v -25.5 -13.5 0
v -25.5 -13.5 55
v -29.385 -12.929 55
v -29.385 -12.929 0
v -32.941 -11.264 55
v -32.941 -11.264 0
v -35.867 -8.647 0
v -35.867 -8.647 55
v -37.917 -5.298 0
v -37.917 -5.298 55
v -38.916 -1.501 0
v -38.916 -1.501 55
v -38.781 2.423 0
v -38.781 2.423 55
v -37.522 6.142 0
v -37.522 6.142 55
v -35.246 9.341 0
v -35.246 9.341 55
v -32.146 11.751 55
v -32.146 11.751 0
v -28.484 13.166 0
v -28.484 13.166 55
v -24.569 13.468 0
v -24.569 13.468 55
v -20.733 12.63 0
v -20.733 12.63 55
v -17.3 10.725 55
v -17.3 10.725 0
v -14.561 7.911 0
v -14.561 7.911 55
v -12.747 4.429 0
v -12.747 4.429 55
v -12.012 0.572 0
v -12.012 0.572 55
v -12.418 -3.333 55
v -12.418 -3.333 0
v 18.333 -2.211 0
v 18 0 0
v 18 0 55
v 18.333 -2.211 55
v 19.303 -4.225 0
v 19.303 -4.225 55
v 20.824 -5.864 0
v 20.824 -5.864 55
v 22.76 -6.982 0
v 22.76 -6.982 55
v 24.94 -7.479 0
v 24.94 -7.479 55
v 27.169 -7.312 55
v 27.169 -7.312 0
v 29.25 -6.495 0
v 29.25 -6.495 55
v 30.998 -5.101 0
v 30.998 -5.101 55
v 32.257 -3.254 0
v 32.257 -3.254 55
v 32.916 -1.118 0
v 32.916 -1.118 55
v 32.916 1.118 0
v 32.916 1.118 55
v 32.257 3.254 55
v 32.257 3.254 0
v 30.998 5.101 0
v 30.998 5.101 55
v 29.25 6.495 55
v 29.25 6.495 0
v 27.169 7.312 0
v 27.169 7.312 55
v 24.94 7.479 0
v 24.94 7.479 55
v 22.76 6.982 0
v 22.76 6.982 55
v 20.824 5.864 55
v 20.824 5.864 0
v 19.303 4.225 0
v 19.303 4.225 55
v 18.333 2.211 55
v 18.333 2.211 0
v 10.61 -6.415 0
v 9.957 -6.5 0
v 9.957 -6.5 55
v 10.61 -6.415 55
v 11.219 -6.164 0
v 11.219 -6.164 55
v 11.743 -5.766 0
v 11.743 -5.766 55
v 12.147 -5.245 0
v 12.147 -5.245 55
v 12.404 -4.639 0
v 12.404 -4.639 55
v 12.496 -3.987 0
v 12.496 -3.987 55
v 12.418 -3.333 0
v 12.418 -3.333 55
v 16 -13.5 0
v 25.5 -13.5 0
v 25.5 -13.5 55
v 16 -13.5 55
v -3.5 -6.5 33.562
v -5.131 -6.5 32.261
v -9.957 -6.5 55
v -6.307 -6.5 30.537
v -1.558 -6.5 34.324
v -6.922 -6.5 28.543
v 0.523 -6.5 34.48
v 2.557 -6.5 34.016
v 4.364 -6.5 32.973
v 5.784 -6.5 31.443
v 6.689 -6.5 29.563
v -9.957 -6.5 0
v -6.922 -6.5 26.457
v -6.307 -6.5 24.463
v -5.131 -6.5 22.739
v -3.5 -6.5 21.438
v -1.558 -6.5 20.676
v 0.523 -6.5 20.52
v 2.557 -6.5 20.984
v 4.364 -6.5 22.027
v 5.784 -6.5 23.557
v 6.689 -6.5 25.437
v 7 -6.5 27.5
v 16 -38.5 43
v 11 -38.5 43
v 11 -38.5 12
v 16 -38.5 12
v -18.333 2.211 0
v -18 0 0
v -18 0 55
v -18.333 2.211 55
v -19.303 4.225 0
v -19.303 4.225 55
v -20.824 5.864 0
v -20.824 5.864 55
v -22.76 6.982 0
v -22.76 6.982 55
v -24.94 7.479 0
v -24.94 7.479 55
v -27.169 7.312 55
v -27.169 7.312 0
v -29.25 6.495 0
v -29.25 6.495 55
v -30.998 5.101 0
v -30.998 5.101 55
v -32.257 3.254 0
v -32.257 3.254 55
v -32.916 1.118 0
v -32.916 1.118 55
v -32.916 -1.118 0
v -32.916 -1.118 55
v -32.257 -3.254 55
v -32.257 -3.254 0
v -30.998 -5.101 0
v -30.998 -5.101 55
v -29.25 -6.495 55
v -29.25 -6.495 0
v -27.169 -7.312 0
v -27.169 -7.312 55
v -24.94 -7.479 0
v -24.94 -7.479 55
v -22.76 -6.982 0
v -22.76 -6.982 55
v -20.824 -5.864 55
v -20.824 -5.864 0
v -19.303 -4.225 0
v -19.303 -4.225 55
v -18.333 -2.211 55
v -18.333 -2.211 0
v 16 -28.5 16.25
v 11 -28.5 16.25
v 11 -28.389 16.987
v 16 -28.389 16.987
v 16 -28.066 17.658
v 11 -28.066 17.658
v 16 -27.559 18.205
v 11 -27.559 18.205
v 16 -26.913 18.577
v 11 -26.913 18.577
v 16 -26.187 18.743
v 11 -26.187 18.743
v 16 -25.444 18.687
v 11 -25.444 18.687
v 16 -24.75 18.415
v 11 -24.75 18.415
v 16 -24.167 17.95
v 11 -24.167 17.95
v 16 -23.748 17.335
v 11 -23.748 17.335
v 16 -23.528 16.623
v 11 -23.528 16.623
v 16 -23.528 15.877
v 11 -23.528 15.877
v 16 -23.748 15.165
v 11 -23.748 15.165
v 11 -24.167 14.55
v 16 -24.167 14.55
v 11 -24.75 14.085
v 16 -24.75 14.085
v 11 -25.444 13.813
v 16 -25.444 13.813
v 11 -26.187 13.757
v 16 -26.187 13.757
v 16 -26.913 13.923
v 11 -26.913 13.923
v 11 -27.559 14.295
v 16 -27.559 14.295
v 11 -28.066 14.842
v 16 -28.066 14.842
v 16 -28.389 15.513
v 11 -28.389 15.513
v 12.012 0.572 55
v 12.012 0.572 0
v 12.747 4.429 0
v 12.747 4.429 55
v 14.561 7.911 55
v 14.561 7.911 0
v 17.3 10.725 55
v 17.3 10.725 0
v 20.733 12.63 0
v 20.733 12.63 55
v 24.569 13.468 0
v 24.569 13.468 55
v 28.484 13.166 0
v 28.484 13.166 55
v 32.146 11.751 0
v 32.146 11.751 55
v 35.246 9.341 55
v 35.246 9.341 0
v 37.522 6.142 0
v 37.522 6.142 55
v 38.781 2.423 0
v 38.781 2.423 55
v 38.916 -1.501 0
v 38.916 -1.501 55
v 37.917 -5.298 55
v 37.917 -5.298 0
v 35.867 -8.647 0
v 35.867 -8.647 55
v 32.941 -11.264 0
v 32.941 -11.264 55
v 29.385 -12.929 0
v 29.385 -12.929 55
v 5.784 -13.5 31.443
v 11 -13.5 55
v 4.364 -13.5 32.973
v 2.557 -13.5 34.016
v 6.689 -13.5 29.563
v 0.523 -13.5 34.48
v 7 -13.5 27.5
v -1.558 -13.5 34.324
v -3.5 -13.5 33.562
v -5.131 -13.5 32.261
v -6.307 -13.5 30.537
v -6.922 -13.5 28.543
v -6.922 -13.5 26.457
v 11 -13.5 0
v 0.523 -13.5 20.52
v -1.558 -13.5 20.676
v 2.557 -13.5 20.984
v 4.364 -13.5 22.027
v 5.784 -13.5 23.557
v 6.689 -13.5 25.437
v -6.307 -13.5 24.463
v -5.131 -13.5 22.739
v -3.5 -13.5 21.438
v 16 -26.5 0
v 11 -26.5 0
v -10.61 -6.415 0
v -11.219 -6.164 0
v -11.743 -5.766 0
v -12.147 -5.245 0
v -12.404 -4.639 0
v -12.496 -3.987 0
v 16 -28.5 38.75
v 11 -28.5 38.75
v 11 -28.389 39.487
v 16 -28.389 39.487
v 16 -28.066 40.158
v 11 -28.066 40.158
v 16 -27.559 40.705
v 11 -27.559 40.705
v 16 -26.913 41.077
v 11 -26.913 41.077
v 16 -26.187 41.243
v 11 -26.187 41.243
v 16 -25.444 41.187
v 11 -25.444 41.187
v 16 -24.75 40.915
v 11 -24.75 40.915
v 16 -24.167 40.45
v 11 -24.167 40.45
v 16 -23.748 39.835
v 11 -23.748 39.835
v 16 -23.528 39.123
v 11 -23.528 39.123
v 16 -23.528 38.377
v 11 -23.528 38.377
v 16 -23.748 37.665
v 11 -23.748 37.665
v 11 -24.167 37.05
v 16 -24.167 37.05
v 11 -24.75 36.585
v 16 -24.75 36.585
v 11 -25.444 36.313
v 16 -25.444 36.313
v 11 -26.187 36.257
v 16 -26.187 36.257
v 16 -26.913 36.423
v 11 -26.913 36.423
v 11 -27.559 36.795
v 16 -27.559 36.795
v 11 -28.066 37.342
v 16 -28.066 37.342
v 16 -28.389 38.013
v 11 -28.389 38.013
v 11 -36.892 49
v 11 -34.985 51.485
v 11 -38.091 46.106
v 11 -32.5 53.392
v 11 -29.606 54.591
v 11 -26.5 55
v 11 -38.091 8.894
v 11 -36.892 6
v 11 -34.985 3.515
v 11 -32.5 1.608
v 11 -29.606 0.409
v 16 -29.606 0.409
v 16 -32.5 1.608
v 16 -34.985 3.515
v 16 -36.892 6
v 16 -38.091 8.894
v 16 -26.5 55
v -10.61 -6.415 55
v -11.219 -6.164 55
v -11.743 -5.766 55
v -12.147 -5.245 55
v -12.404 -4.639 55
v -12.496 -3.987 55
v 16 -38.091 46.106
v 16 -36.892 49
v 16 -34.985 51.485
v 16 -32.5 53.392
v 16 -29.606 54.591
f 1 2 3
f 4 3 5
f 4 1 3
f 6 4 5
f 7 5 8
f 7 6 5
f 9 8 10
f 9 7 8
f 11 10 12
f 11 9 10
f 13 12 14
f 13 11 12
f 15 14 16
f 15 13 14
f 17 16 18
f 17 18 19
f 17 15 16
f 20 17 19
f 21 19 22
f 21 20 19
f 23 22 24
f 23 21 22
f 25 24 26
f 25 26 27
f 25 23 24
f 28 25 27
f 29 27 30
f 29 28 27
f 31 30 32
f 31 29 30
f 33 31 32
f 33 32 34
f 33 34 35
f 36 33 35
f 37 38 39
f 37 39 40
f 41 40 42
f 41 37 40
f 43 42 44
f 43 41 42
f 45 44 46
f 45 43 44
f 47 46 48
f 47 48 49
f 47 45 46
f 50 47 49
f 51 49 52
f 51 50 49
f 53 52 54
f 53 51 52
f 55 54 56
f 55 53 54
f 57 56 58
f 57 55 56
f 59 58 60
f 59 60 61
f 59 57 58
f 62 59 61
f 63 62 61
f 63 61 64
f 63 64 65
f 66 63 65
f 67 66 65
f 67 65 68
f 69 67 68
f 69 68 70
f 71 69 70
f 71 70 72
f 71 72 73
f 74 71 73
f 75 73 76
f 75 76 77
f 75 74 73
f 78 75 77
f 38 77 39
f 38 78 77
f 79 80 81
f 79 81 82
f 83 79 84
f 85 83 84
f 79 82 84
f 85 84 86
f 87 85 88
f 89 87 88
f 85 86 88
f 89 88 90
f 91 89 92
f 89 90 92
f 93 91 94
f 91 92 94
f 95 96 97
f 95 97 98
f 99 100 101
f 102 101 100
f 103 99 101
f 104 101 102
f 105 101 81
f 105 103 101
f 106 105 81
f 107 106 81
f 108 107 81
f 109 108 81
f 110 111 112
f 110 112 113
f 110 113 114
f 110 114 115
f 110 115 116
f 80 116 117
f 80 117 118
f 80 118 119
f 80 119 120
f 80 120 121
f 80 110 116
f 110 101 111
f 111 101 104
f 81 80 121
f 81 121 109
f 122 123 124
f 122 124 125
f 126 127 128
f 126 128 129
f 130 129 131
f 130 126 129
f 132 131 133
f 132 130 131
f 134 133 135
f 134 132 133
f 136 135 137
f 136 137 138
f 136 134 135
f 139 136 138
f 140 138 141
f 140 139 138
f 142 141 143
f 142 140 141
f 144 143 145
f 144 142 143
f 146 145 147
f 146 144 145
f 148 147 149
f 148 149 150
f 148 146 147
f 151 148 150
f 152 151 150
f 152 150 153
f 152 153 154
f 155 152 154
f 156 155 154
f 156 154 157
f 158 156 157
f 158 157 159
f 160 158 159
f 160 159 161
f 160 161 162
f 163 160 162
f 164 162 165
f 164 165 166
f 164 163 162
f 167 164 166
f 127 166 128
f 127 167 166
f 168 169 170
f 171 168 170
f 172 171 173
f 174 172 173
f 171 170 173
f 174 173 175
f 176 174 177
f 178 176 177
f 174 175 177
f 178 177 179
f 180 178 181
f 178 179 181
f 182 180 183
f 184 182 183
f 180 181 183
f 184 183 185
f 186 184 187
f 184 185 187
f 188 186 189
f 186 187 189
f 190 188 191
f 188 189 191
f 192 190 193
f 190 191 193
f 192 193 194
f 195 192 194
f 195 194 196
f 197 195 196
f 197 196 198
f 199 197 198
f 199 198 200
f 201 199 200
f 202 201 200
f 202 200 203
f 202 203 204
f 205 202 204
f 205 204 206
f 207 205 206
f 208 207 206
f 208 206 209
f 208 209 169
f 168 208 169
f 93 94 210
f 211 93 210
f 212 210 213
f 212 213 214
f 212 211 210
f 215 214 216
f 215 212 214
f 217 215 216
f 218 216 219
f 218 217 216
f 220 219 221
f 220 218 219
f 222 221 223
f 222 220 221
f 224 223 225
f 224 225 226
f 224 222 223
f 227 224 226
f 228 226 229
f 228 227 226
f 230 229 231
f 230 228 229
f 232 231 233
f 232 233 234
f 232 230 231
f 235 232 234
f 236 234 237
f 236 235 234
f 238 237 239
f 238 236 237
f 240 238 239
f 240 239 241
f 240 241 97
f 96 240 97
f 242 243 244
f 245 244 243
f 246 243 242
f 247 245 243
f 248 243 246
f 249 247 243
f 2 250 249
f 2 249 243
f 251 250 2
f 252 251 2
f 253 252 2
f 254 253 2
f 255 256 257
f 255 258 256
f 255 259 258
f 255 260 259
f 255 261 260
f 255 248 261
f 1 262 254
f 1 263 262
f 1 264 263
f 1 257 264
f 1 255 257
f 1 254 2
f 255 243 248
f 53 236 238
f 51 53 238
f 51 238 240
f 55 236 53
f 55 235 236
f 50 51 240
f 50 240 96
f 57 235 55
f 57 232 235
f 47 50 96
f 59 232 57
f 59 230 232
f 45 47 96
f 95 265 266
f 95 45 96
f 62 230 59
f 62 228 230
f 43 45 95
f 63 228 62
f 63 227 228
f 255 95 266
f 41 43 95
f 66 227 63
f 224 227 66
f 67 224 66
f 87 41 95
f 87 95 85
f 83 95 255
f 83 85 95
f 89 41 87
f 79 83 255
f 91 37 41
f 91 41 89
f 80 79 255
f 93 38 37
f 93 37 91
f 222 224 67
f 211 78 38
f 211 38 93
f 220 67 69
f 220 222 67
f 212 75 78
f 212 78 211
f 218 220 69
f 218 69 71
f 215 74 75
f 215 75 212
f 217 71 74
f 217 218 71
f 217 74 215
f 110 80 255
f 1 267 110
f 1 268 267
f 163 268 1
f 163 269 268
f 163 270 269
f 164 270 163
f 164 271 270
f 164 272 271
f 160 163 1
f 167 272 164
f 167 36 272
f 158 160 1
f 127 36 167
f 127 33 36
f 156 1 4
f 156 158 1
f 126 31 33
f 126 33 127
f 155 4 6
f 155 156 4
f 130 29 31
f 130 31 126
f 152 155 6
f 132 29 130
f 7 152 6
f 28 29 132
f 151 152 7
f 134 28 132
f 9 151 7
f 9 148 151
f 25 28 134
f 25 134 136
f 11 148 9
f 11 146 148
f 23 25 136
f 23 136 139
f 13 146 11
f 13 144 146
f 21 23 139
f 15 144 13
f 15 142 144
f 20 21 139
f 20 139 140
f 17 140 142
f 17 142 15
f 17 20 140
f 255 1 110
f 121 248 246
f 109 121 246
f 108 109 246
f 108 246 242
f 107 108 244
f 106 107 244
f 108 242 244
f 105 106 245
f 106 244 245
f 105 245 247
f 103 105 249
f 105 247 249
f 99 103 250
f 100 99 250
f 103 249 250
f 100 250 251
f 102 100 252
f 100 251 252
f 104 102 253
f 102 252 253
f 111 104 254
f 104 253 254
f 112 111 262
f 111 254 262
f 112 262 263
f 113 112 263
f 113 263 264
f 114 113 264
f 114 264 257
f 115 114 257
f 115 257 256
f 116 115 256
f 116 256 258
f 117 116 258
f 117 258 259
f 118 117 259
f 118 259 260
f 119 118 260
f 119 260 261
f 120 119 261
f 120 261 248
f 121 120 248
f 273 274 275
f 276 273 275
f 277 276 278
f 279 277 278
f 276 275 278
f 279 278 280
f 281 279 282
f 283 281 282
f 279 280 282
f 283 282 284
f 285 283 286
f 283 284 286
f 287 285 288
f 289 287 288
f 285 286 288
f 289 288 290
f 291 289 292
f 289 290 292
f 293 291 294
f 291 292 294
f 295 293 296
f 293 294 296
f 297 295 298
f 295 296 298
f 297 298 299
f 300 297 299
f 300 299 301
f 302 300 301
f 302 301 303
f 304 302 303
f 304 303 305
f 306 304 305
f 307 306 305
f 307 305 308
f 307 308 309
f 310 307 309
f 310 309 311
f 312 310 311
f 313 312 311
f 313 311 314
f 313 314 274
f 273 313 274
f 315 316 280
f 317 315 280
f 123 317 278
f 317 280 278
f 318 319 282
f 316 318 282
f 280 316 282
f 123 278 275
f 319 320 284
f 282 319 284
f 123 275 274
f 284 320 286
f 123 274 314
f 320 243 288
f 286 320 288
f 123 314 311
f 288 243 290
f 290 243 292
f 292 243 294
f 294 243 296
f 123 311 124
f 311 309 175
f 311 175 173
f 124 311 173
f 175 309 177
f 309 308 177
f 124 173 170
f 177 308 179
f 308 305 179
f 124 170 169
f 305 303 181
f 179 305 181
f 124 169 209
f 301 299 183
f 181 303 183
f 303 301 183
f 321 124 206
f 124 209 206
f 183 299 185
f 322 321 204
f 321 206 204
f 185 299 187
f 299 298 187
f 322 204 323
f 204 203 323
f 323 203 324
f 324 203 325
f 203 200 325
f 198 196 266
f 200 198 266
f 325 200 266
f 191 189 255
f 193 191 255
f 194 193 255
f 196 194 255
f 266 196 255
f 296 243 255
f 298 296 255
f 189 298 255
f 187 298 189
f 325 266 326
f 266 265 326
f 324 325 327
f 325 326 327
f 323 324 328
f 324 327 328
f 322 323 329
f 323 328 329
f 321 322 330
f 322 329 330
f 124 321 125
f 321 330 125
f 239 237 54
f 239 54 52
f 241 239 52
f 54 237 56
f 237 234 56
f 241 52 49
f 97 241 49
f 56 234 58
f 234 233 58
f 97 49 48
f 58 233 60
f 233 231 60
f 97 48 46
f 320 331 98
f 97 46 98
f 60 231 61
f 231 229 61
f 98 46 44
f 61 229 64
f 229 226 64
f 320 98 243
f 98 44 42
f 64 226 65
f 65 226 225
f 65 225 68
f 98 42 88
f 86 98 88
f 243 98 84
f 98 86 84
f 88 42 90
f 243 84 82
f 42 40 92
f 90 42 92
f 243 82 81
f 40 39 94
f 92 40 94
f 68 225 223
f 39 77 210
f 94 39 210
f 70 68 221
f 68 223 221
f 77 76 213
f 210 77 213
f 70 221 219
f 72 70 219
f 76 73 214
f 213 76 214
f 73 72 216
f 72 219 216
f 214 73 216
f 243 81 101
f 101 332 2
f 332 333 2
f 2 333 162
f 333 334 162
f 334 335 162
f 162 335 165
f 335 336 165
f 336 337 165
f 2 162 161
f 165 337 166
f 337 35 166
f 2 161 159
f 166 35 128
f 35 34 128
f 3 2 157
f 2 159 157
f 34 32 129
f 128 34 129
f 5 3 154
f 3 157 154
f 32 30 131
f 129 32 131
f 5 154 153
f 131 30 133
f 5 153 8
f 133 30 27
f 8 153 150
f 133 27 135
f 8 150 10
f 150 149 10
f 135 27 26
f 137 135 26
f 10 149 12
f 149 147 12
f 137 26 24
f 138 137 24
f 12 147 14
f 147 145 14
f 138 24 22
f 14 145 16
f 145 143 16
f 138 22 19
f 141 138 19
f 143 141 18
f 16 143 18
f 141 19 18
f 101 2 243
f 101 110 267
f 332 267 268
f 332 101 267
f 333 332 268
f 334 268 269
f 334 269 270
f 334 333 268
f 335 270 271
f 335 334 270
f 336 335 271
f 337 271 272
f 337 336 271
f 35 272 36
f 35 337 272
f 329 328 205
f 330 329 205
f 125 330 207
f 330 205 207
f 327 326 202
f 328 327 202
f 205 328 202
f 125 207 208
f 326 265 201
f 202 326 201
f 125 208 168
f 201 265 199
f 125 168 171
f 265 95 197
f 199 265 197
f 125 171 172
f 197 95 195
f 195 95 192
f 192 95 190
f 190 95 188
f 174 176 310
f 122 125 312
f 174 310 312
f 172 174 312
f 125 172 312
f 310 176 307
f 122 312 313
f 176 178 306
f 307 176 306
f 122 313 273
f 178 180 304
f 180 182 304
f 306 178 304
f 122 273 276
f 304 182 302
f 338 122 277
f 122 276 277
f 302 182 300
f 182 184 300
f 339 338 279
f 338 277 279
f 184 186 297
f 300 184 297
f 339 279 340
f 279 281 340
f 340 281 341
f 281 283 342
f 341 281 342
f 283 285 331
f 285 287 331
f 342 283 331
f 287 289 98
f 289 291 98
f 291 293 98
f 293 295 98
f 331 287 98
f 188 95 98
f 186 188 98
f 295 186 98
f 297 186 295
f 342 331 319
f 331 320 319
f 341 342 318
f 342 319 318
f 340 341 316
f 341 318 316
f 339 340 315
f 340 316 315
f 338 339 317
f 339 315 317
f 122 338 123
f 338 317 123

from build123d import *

# Parameters (mm, degrees)
SKETCH1_R           = 7.5
BOSS_EXTRUDE1_DEPTH = 55
FILLET1_R           = 2.54
BOSS_EXTRUDE2_DEPTH = 25
SKETCH4_R           = 7
CUT_EXTRUDE1_DEPTH  = 73.629195232
FILLET2_R           = 12
SKETCH5_R           = 2.5
CUT_EXTRUDE2_DEPTH  = 87.734978206


with BuildPart() as part:
    # Sketch1 → Boss-Extrude1 (new body)
    with BuildSketch(Plane.XY):
        with BuildLine():
            Line((-13.667840434, -6.5), (13.667840434, -6.5))
            ThreePointArc((13.667840434, -6.5), (32.373863542, 11.618950039), (25.5, -13.5))
            Line((25.5, -13.5), (-25.5, -13.5))
            ThreePointArc((-25.5, -13.5), (-32.373863542, 11.618950039), (-13.667840434, -6.5))
        make_face()
        with Locations((-25.5, 0)):
            Circle(SKETCH1_R, mode=Mode.SUBTRACT)
        with Locations(Location((25.5, 0, 0), (0, 0, 180))):
            Circle(SKETCH1_R, mode=Mode.SUBTRACT)
    extrude(amount=BOSS_EXTRUDE1_DEPTH)

    # Fillet1
    fillet1_edges = [part.edges().sort_by_distance(p)[0] for p in [
        (-13.667840434, -6.5, 27.5),
        (13.667840434, -6.5, 27.5),
    ]]
    fillet(fillet1_edges, radius=FILLET1_R)

    # Sketch2 → Boss-Extrude2 (add)
    with BuildSketch(Plane.XZ.offset(13.5)):
        Polygon((11, 15.637254902), (16, 10.245098039), (16, 55), (11, 55), align=None)
        Polygon((16, 0), (16, 10.245098039), (11, 15.637254902), (11, 0), align=None)
    extrude(amount=BOSS_EXTRUDE2_DEPTH)

    # Sketch4 → Cut-Extrude1 (cut, through all)
    with BuildSketch(Plane.XZ.offset(13.5)):
        with Locations((0, 27.5)):
            Circle(SKETCH4_R)
    extrude(amount=-CUT_EXTRUDE1_DEPTH, mode=Mode.SUBTRACT)

    # Fillet2
    fillet2_edges = [part.edges().sort_by_distance(p)[0] for p in [
        (13.5, -38.5, 0),
        (13.5, -38.5, 55),
    ]]
    fillet(fillet2_edges, radius=FILLET2_R)

    # Sketch5 → Cut-Extrude2 (cut, through all)
    with BuildSketch(Plane(origin=(11, 11.194119758, 4.468317801), x_dir=(0, 0, 1), z_dir=(-1, 0, 0))):
        with Locations(Location((11.781682199, -37.194119758, 0), (0, 0, 270))):
            Circle(SKETCH5_R)
        with Locations(Location((34.281682199, -37.194119758, 0), (0, 0, 270))):
            Circle(SKETCH5_R)
    extrude(amount=-CUT_EXTRUDE2_DEPTH, mode=Mode.SUBTRACT)


solid = part.part
